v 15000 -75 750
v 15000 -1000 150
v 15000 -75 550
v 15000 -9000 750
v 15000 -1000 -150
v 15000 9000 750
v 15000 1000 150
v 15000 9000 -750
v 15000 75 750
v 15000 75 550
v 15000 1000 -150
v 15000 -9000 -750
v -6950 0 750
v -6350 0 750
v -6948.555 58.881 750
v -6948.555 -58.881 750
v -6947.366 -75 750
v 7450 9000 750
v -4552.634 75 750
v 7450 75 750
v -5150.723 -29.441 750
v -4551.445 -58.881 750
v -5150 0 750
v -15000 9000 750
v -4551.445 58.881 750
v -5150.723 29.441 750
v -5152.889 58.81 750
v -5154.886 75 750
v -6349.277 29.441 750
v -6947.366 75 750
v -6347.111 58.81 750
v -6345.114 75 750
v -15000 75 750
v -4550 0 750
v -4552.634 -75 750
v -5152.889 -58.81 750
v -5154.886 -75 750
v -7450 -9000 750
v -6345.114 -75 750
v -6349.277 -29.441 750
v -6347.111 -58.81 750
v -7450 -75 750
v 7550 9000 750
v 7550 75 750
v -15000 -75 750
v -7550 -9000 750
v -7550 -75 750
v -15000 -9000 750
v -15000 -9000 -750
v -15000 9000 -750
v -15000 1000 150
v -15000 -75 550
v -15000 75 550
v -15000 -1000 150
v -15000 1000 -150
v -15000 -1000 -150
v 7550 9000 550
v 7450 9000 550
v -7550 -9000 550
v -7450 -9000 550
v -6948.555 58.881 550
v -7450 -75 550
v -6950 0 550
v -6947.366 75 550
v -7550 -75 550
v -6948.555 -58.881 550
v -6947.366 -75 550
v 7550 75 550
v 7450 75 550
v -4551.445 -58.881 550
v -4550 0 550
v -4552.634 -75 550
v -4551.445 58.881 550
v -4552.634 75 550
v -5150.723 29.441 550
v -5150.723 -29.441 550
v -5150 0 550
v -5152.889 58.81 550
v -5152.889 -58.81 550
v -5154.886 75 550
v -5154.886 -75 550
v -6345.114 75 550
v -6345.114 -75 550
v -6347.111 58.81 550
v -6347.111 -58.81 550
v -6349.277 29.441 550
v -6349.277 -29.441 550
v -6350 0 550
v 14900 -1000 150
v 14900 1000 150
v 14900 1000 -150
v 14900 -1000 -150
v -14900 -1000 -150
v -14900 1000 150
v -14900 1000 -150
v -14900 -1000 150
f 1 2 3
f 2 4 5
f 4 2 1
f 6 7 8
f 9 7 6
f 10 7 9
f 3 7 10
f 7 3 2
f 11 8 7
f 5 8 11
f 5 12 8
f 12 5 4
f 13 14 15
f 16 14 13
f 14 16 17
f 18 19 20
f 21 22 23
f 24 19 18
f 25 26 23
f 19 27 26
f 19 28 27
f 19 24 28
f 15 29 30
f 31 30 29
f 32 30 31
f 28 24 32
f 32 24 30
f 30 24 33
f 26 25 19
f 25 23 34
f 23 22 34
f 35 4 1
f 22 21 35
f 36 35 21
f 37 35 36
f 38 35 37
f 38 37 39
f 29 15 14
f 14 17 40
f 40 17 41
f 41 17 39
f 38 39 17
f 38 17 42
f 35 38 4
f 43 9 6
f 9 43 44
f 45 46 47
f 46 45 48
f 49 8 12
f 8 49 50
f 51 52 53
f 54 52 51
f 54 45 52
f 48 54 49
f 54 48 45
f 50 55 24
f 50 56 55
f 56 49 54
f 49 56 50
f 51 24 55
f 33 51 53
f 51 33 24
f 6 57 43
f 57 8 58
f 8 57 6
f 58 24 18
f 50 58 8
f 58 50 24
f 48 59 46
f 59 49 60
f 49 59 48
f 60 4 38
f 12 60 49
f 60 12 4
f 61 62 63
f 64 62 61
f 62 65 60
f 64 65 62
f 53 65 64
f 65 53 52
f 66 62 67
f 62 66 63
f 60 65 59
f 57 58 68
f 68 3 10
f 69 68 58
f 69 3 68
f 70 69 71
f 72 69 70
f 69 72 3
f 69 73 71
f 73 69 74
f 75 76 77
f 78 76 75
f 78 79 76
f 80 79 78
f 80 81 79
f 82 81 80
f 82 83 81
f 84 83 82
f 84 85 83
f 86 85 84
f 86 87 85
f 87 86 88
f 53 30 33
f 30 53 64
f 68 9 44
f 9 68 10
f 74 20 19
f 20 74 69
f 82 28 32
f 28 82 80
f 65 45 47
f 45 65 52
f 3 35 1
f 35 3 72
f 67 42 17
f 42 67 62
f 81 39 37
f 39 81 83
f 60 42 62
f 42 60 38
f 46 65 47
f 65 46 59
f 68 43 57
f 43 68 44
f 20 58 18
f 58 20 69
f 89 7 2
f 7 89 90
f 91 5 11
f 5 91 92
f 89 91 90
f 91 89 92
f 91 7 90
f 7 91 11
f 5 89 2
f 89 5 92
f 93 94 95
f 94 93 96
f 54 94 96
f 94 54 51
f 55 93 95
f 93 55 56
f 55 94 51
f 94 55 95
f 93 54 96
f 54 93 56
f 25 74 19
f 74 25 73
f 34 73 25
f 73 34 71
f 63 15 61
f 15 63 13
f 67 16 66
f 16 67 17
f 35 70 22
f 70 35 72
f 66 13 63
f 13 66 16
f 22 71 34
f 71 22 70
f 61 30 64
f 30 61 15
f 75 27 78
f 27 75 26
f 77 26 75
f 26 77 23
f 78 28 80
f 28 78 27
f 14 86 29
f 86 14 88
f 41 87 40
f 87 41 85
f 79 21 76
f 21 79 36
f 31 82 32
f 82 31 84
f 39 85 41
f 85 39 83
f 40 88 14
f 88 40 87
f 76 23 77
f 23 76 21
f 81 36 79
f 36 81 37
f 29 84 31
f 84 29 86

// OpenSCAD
// file: solid_state_harness.scad
// =========================================================================
// GRUMMAN-STYLED INFLATABLE CARRIER - EMBEDDED SOLID-STATE HARNESS
// MANUFACTURER: HUNTINGTON INGALLS / NEWPORT NEWS SHIPBUILDING
// MATERIAL SPECIFICATION: SOLID-STATE CONDUIT IN GRADE 5 TITANIUM
// =========================================================================

module titanium_harness_plate(length=30000, width=18000, thickness=1500) {
    difference() {
        // Core Grade 5 Titanium Flatbed Hinge Plate
        cube([length, width, thickness], center=true);
        
        // Longitudinal Conduit Channel for Embedded 3oz Copper Power Bus
        translate([0, 0, thickness/2 - 100])
            cube([length + 20, 150, 200], center=true);
            
        // Left Divergent Feed for Continuous 12V Blower Power Routing
        translate([-length/4, -width/4, thickness/2 - 100])
            cube([100, width/2, 200], center=true);
            
        // Right Divergent Feed for Submersible Bilge Sump Power Routing
        translate([length/4, width/4, thickness/2 - 100])
            cube([100, width/2, 200], center=true);
            
        // Pocket Cuts at Hinge Faces for Flush 24K Gold Lattice Snap Junctions
        translate([length/2 - 50, 0, 0])
            cube([100, 2000, 300], center=true);
        translate([-length/2 + 50, 0, 0])
            cube([100, 2000, 300], center=true);
    }
}

// Render structural segment with integrated wiring cavities
titanium_harness_plate();
// main file
// =========================================================================
// GRUMMAN-STYLED INFLATABLE CARRIER - TOW-HEAD MODULE WITH SENSOR POCKETS
// MANUFACTURER: HUNTINGTON INGALLS / NEWPORT NEWS SHIPBUILDING
// MATERIAL PROFILE: GRADE 5 TITANIUM REINFORCED WITH STRAIN GAUGE WELLS
// =========================================================================

include <solid_state_harness.scad>

module titanium_tow_head_v2(length=10000, width=18000, thickness=1500) {
    difference() {
        // Main Lead Panel Structure
        cube([length, width, thickness], center=true);
        
        // Internal Conduit Cuts for Embedded Solid-State Harness
        translate([0, 0, thickness/2 - 100])
            cube([length + 20, 150, 200], center=true);
            
        // Aft Hinge Interface Pocket for 24K Gold Lattice Inserts
        translate([length/2 - 50, 0, 0])
            cube([100, width - 2000, thickness - 200], center=true);
            
        // Embedded Sensor Pockets (For Real-Time Cable Strain Telemetry)
        translate([-length/2 + 1000, -1000, thickness/2 - 200])
            cube([400, 400, 300], center=true); // Left Sensor Pocket
        translate([-length/2 + 1000, 1000, thickness/2 - 200])
            cube([400, 400, 300], center=true);  // Right Sensor Pocket
    }
    
    // Reinforced External Tow Eye Loop (For Rope or Cable Rigging)
    translate([-length/2 - 750, 0, 0]) {
        difference() {
            rotate([0, 0, 0]) cylinder(h=1500, r=1200, center=true, $fn=128);
            rotate([0, 0, 0]) cylinder(h=1600, r=600, center=true, $fn=128);
        }
    }
}

// Render upgraded tow-head structural block
titanium_tow_head_v2();
